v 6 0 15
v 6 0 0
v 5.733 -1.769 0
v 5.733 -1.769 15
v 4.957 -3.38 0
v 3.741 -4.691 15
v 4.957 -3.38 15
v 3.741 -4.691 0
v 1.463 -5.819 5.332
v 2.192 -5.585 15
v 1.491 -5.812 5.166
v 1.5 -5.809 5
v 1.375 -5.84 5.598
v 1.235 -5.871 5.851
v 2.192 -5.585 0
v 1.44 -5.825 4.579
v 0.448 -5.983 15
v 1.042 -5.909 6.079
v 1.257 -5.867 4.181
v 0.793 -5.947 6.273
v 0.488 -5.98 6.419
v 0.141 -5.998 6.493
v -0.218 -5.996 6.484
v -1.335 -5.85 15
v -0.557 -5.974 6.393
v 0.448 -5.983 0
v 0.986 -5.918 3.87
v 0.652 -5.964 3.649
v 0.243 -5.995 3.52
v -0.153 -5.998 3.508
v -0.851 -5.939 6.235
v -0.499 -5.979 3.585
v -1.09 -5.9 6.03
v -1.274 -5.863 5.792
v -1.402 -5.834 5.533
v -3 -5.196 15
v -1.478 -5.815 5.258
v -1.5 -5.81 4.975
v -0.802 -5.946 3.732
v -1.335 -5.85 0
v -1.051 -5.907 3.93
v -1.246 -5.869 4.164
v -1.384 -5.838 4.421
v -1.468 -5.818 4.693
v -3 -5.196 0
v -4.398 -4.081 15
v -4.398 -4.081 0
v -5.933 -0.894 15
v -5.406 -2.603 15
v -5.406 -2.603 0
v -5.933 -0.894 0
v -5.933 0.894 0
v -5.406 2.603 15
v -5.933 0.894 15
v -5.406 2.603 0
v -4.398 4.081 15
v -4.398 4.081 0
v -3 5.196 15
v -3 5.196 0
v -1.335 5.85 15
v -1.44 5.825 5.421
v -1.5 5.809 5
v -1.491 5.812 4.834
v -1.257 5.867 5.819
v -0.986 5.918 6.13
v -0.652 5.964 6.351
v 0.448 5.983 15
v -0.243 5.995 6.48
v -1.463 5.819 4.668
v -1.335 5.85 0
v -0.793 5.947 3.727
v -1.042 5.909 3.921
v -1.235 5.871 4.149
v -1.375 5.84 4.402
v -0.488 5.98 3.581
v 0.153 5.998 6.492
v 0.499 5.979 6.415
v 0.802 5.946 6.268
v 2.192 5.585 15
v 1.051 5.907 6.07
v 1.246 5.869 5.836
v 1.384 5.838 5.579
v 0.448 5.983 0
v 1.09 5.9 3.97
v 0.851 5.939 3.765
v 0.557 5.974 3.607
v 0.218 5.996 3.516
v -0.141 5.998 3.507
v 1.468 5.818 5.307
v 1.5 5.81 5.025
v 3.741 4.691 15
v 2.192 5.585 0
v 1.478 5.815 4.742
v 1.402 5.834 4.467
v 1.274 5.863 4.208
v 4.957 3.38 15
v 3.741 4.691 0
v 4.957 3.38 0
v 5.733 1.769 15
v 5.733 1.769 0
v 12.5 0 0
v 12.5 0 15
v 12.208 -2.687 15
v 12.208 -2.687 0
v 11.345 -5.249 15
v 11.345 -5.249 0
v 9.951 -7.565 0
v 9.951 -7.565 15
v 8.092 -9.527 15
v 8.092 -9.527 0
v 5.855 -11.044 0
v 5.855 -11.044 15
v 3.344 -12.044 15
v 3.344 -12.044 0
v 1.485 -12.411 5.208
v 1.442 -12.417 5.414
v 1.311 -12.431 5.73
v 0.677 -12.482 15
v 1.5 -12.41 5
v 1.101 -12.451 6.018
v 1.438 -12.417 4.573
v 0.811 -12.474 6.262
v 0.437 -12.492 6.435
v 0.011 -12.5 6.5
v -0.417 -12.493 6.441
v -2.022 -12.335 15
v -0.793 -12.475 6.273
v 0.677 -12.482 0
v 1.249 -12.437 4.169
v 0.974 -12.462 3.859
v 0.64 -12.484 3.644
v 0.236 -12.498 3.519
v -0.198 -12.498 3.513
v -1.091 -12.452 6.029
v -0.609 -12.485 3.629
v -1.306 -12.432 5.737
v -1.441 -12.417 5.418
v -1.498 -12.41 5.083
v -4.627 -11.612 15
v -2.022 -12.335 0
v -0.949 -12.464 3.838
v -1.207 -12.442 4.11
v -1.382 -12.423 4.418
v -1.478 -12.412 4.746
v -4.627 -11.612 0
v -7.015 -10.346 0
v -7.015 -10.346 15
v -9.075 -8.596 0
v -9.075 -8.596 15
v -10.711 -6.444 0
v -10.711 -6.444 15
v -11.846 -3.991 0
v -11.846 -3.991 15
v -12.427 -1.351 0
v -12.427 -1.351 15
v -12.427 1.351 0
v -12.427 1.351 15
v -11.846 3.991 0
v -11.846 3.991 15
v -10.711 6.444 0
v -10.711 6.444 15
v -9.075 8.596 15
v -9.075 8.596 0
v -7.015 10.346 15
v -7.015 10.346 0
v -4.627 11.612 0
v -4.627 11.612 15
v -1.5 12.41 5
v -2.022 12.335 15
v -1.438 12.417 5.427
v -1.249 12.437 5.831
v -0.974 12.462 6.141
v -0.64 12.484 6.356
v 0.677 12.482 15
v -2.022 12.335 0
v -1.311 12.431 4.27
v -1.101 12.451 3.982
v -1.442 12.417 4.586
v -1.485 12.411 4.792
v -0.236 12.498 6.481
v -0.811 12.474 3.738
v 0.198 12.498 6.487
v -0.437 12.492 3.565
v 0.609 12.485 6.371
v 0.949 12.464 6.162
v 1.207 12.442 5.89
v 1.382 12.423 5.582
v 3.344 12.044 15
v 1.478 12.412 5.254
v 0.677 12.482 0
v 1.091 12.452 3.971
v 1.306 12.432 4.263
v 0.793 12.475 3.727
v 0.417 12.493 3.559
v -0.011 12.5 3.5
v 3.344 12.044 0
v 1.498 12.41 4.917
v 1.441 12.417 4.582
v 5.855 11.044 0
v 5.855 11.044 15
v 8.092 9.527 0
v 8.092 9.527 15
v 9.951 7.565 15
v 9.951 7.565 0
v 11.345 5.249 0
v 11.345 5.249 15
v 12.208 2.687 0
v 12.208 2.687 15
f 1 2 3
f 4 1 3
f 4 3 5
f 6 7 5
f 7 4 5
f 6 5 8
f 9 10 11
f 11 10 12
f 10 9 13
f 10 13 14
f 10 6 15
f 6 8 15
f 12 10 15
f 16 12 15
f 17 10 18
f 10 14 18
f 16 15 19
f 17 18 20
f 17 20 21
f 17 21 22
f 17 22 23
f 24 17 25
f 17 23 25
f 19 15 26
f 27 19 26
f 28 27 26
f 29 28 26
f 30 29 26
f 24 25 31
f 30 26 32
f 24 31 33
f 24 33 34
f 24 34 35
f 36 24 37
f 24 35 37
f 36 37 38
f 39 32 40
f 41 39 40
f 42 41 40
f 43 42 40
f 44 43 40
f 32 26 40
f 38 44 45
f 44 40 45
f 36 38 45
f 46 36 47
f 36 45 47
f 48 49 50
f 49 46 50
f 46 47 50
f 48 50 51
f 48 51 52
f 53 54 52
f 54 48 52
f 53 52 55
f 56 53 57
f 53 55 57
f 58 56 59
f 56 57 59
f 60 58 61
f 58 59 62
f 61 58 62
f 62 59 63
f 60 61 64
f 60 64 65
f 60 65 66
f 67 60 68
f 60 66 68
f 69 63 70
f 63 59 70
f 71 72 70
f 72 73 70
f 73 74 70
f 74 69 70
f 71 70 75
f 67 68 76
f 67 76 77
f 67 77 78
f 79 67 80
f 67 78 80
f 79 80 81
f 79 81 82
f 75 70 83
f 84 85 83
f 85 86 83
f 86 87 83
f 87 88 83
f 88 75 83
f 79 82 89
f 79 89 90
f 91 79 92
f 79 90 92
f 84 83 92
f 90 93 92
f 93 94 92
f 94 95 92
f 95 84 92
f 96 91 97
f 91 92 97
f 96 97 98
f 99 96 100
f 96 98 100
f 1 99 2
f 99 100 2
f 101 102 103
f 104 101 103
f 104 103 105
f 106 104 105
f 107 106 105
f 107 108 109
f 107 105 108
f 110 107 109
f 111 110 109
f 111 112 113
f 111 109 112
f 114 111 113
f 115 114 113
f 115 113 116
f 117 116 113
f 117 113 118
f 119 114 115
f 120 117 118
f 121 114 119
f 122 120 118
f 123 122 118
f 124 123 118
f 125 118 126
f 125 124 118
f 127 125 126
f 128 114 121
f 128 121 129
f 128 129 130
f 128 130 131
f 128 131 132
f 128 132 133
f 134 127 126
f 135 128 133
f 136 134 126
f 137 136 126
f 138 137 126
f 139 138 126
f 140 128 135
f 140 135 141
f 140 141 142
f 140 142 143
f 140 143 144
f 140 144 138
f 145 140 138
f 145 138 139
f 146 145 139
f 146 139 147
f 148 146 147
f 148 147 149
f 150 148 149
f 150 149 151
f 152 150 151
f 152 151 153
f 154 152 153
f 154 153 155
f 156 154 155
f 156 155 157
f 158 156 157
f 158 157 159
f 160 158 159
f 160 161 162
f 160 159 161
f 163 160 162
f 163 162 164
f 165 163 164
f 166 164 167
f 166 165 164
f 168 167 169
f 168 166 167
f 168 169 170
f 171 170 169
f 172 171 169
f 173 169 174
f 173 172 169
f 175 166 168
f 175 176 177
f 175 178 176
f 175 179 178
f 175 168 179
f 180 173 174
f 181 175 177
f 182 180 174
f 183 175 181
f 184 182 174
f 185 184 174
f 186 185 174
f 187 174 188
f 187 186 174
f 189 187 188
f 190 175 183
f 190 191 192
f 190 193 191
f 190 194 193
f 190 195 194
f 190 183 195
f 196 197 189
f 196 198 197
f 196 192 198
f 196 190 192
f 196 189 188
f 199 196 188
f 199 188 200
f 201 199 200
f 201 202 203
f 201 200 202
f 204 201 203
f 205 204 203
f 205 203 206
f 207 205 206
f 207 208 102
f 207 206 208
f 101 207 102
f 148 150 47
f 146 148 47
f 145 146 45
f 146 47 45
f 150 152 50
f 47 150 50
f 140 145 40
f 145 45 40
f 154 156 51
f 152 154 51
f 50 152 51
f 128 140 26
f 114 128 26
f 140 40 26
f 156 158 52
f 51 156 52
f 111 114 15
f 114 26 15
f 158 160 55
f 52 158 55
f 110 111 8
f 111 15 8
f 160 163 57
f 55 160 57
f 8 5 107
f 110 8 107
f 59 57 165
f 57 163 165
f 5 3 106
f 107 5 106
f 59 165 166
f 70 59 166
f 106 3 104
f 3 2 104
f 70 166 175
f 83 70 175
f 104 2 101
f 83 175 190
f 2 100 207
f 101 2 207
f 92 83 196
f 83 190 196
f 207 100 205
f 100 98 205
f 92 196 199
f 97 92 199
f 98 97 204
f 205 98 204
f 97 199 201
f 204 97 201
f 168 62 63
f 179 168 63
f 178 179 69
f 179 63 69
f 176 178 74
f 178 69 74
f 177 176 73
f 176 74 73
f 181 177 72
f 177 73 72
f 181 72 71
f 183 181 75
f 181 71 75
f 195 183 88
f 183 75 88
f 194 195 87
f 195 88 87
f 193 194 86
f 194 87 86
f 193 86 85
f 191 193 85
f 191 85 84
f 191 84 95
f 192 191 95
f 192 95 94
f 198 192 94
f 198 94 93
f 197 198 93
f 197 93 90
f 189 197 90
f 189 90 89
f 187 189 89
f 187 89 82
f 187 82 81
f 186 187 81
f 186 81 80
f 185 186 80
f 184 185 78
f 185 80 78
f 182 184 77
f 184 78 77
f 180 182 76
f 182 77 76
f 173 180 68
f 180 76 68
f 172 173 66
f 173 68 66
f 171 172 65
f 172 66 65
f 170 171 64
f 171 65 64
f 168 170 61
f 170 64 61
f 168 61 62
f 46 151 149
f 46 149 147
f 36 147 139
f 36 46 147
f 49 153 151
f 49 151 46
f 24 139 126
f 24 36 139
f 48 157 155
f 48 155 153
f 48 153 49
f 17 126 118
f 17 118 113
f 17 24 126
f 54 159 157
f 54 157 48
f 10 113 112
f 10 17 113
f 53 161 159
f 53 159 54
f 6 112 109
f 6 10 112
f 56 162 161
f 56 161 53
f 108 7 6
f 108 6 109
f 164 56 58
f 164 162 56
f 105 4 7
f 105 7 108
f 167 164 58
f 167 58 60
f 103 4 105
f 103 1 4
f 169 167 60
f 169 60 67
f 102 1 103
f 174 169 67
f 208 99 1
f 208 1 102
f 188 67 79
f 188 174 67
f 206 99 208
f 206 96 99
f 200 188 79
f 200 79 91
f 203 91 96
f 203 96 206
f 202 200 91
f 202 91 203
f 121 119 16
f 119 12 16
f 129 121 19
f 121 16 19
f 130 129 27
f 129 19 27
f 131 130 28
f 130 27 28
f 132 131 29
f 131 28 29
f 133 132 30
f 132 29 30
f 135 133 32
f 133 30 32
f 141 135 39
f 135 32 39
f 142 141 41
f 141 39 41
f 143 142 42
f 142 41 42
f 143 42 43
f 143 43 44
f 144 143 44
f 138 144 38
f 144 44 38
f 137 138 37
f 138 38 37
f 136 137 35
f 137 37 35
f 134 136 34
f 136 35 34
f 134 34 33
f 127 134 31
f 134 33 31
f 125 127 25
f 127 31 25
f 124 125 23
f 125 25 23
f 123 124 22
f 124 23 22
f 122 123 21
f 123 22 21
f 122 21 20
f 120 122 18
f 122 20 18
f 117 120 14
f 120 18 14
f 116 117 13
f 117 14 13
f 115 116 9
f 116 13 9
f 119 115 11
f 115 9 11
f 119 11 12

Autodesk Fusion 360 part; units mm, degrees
sketch "Sketch1" plane through (0, 0, 0) normal (0, 0, 1) x (1, 0, 0)
  circle A0 centre (0, 0) radius 12.5
  circle A1 centre (0, 0) radius 6
  dimension "d1" = 25
  dimension "d2" = 12
extrude "Extrude1" add sketch "Sketch1" along normal blind 15
sketch "Sketch2" plane through (0, 0, 0) normal (0, 1, 0) x (1, 0, 0)
  circle A0 centre (0, -5) radius 1.5
  dimension "d5" = 3
extrude "Extrude2" cut sketch "Sketch2" against normal blind 60
sketch "Sketch3" plane through (0, 0, 0) normal (0, 1, 0) x (-1, 0, 0)
  circle A0 centre (0, 5) radius 1.5
  dimension "d8" = 3
extrude "Extrude3" cut sketch "Sketch3" along normal blind 30
sketch "Sketch4" plane through (0, 0, 0) normal (0, 1, 0) x (1, 0, 0)
  circle A0 centre (0, -5) radius 1.5
  dimension "d9" = 3
